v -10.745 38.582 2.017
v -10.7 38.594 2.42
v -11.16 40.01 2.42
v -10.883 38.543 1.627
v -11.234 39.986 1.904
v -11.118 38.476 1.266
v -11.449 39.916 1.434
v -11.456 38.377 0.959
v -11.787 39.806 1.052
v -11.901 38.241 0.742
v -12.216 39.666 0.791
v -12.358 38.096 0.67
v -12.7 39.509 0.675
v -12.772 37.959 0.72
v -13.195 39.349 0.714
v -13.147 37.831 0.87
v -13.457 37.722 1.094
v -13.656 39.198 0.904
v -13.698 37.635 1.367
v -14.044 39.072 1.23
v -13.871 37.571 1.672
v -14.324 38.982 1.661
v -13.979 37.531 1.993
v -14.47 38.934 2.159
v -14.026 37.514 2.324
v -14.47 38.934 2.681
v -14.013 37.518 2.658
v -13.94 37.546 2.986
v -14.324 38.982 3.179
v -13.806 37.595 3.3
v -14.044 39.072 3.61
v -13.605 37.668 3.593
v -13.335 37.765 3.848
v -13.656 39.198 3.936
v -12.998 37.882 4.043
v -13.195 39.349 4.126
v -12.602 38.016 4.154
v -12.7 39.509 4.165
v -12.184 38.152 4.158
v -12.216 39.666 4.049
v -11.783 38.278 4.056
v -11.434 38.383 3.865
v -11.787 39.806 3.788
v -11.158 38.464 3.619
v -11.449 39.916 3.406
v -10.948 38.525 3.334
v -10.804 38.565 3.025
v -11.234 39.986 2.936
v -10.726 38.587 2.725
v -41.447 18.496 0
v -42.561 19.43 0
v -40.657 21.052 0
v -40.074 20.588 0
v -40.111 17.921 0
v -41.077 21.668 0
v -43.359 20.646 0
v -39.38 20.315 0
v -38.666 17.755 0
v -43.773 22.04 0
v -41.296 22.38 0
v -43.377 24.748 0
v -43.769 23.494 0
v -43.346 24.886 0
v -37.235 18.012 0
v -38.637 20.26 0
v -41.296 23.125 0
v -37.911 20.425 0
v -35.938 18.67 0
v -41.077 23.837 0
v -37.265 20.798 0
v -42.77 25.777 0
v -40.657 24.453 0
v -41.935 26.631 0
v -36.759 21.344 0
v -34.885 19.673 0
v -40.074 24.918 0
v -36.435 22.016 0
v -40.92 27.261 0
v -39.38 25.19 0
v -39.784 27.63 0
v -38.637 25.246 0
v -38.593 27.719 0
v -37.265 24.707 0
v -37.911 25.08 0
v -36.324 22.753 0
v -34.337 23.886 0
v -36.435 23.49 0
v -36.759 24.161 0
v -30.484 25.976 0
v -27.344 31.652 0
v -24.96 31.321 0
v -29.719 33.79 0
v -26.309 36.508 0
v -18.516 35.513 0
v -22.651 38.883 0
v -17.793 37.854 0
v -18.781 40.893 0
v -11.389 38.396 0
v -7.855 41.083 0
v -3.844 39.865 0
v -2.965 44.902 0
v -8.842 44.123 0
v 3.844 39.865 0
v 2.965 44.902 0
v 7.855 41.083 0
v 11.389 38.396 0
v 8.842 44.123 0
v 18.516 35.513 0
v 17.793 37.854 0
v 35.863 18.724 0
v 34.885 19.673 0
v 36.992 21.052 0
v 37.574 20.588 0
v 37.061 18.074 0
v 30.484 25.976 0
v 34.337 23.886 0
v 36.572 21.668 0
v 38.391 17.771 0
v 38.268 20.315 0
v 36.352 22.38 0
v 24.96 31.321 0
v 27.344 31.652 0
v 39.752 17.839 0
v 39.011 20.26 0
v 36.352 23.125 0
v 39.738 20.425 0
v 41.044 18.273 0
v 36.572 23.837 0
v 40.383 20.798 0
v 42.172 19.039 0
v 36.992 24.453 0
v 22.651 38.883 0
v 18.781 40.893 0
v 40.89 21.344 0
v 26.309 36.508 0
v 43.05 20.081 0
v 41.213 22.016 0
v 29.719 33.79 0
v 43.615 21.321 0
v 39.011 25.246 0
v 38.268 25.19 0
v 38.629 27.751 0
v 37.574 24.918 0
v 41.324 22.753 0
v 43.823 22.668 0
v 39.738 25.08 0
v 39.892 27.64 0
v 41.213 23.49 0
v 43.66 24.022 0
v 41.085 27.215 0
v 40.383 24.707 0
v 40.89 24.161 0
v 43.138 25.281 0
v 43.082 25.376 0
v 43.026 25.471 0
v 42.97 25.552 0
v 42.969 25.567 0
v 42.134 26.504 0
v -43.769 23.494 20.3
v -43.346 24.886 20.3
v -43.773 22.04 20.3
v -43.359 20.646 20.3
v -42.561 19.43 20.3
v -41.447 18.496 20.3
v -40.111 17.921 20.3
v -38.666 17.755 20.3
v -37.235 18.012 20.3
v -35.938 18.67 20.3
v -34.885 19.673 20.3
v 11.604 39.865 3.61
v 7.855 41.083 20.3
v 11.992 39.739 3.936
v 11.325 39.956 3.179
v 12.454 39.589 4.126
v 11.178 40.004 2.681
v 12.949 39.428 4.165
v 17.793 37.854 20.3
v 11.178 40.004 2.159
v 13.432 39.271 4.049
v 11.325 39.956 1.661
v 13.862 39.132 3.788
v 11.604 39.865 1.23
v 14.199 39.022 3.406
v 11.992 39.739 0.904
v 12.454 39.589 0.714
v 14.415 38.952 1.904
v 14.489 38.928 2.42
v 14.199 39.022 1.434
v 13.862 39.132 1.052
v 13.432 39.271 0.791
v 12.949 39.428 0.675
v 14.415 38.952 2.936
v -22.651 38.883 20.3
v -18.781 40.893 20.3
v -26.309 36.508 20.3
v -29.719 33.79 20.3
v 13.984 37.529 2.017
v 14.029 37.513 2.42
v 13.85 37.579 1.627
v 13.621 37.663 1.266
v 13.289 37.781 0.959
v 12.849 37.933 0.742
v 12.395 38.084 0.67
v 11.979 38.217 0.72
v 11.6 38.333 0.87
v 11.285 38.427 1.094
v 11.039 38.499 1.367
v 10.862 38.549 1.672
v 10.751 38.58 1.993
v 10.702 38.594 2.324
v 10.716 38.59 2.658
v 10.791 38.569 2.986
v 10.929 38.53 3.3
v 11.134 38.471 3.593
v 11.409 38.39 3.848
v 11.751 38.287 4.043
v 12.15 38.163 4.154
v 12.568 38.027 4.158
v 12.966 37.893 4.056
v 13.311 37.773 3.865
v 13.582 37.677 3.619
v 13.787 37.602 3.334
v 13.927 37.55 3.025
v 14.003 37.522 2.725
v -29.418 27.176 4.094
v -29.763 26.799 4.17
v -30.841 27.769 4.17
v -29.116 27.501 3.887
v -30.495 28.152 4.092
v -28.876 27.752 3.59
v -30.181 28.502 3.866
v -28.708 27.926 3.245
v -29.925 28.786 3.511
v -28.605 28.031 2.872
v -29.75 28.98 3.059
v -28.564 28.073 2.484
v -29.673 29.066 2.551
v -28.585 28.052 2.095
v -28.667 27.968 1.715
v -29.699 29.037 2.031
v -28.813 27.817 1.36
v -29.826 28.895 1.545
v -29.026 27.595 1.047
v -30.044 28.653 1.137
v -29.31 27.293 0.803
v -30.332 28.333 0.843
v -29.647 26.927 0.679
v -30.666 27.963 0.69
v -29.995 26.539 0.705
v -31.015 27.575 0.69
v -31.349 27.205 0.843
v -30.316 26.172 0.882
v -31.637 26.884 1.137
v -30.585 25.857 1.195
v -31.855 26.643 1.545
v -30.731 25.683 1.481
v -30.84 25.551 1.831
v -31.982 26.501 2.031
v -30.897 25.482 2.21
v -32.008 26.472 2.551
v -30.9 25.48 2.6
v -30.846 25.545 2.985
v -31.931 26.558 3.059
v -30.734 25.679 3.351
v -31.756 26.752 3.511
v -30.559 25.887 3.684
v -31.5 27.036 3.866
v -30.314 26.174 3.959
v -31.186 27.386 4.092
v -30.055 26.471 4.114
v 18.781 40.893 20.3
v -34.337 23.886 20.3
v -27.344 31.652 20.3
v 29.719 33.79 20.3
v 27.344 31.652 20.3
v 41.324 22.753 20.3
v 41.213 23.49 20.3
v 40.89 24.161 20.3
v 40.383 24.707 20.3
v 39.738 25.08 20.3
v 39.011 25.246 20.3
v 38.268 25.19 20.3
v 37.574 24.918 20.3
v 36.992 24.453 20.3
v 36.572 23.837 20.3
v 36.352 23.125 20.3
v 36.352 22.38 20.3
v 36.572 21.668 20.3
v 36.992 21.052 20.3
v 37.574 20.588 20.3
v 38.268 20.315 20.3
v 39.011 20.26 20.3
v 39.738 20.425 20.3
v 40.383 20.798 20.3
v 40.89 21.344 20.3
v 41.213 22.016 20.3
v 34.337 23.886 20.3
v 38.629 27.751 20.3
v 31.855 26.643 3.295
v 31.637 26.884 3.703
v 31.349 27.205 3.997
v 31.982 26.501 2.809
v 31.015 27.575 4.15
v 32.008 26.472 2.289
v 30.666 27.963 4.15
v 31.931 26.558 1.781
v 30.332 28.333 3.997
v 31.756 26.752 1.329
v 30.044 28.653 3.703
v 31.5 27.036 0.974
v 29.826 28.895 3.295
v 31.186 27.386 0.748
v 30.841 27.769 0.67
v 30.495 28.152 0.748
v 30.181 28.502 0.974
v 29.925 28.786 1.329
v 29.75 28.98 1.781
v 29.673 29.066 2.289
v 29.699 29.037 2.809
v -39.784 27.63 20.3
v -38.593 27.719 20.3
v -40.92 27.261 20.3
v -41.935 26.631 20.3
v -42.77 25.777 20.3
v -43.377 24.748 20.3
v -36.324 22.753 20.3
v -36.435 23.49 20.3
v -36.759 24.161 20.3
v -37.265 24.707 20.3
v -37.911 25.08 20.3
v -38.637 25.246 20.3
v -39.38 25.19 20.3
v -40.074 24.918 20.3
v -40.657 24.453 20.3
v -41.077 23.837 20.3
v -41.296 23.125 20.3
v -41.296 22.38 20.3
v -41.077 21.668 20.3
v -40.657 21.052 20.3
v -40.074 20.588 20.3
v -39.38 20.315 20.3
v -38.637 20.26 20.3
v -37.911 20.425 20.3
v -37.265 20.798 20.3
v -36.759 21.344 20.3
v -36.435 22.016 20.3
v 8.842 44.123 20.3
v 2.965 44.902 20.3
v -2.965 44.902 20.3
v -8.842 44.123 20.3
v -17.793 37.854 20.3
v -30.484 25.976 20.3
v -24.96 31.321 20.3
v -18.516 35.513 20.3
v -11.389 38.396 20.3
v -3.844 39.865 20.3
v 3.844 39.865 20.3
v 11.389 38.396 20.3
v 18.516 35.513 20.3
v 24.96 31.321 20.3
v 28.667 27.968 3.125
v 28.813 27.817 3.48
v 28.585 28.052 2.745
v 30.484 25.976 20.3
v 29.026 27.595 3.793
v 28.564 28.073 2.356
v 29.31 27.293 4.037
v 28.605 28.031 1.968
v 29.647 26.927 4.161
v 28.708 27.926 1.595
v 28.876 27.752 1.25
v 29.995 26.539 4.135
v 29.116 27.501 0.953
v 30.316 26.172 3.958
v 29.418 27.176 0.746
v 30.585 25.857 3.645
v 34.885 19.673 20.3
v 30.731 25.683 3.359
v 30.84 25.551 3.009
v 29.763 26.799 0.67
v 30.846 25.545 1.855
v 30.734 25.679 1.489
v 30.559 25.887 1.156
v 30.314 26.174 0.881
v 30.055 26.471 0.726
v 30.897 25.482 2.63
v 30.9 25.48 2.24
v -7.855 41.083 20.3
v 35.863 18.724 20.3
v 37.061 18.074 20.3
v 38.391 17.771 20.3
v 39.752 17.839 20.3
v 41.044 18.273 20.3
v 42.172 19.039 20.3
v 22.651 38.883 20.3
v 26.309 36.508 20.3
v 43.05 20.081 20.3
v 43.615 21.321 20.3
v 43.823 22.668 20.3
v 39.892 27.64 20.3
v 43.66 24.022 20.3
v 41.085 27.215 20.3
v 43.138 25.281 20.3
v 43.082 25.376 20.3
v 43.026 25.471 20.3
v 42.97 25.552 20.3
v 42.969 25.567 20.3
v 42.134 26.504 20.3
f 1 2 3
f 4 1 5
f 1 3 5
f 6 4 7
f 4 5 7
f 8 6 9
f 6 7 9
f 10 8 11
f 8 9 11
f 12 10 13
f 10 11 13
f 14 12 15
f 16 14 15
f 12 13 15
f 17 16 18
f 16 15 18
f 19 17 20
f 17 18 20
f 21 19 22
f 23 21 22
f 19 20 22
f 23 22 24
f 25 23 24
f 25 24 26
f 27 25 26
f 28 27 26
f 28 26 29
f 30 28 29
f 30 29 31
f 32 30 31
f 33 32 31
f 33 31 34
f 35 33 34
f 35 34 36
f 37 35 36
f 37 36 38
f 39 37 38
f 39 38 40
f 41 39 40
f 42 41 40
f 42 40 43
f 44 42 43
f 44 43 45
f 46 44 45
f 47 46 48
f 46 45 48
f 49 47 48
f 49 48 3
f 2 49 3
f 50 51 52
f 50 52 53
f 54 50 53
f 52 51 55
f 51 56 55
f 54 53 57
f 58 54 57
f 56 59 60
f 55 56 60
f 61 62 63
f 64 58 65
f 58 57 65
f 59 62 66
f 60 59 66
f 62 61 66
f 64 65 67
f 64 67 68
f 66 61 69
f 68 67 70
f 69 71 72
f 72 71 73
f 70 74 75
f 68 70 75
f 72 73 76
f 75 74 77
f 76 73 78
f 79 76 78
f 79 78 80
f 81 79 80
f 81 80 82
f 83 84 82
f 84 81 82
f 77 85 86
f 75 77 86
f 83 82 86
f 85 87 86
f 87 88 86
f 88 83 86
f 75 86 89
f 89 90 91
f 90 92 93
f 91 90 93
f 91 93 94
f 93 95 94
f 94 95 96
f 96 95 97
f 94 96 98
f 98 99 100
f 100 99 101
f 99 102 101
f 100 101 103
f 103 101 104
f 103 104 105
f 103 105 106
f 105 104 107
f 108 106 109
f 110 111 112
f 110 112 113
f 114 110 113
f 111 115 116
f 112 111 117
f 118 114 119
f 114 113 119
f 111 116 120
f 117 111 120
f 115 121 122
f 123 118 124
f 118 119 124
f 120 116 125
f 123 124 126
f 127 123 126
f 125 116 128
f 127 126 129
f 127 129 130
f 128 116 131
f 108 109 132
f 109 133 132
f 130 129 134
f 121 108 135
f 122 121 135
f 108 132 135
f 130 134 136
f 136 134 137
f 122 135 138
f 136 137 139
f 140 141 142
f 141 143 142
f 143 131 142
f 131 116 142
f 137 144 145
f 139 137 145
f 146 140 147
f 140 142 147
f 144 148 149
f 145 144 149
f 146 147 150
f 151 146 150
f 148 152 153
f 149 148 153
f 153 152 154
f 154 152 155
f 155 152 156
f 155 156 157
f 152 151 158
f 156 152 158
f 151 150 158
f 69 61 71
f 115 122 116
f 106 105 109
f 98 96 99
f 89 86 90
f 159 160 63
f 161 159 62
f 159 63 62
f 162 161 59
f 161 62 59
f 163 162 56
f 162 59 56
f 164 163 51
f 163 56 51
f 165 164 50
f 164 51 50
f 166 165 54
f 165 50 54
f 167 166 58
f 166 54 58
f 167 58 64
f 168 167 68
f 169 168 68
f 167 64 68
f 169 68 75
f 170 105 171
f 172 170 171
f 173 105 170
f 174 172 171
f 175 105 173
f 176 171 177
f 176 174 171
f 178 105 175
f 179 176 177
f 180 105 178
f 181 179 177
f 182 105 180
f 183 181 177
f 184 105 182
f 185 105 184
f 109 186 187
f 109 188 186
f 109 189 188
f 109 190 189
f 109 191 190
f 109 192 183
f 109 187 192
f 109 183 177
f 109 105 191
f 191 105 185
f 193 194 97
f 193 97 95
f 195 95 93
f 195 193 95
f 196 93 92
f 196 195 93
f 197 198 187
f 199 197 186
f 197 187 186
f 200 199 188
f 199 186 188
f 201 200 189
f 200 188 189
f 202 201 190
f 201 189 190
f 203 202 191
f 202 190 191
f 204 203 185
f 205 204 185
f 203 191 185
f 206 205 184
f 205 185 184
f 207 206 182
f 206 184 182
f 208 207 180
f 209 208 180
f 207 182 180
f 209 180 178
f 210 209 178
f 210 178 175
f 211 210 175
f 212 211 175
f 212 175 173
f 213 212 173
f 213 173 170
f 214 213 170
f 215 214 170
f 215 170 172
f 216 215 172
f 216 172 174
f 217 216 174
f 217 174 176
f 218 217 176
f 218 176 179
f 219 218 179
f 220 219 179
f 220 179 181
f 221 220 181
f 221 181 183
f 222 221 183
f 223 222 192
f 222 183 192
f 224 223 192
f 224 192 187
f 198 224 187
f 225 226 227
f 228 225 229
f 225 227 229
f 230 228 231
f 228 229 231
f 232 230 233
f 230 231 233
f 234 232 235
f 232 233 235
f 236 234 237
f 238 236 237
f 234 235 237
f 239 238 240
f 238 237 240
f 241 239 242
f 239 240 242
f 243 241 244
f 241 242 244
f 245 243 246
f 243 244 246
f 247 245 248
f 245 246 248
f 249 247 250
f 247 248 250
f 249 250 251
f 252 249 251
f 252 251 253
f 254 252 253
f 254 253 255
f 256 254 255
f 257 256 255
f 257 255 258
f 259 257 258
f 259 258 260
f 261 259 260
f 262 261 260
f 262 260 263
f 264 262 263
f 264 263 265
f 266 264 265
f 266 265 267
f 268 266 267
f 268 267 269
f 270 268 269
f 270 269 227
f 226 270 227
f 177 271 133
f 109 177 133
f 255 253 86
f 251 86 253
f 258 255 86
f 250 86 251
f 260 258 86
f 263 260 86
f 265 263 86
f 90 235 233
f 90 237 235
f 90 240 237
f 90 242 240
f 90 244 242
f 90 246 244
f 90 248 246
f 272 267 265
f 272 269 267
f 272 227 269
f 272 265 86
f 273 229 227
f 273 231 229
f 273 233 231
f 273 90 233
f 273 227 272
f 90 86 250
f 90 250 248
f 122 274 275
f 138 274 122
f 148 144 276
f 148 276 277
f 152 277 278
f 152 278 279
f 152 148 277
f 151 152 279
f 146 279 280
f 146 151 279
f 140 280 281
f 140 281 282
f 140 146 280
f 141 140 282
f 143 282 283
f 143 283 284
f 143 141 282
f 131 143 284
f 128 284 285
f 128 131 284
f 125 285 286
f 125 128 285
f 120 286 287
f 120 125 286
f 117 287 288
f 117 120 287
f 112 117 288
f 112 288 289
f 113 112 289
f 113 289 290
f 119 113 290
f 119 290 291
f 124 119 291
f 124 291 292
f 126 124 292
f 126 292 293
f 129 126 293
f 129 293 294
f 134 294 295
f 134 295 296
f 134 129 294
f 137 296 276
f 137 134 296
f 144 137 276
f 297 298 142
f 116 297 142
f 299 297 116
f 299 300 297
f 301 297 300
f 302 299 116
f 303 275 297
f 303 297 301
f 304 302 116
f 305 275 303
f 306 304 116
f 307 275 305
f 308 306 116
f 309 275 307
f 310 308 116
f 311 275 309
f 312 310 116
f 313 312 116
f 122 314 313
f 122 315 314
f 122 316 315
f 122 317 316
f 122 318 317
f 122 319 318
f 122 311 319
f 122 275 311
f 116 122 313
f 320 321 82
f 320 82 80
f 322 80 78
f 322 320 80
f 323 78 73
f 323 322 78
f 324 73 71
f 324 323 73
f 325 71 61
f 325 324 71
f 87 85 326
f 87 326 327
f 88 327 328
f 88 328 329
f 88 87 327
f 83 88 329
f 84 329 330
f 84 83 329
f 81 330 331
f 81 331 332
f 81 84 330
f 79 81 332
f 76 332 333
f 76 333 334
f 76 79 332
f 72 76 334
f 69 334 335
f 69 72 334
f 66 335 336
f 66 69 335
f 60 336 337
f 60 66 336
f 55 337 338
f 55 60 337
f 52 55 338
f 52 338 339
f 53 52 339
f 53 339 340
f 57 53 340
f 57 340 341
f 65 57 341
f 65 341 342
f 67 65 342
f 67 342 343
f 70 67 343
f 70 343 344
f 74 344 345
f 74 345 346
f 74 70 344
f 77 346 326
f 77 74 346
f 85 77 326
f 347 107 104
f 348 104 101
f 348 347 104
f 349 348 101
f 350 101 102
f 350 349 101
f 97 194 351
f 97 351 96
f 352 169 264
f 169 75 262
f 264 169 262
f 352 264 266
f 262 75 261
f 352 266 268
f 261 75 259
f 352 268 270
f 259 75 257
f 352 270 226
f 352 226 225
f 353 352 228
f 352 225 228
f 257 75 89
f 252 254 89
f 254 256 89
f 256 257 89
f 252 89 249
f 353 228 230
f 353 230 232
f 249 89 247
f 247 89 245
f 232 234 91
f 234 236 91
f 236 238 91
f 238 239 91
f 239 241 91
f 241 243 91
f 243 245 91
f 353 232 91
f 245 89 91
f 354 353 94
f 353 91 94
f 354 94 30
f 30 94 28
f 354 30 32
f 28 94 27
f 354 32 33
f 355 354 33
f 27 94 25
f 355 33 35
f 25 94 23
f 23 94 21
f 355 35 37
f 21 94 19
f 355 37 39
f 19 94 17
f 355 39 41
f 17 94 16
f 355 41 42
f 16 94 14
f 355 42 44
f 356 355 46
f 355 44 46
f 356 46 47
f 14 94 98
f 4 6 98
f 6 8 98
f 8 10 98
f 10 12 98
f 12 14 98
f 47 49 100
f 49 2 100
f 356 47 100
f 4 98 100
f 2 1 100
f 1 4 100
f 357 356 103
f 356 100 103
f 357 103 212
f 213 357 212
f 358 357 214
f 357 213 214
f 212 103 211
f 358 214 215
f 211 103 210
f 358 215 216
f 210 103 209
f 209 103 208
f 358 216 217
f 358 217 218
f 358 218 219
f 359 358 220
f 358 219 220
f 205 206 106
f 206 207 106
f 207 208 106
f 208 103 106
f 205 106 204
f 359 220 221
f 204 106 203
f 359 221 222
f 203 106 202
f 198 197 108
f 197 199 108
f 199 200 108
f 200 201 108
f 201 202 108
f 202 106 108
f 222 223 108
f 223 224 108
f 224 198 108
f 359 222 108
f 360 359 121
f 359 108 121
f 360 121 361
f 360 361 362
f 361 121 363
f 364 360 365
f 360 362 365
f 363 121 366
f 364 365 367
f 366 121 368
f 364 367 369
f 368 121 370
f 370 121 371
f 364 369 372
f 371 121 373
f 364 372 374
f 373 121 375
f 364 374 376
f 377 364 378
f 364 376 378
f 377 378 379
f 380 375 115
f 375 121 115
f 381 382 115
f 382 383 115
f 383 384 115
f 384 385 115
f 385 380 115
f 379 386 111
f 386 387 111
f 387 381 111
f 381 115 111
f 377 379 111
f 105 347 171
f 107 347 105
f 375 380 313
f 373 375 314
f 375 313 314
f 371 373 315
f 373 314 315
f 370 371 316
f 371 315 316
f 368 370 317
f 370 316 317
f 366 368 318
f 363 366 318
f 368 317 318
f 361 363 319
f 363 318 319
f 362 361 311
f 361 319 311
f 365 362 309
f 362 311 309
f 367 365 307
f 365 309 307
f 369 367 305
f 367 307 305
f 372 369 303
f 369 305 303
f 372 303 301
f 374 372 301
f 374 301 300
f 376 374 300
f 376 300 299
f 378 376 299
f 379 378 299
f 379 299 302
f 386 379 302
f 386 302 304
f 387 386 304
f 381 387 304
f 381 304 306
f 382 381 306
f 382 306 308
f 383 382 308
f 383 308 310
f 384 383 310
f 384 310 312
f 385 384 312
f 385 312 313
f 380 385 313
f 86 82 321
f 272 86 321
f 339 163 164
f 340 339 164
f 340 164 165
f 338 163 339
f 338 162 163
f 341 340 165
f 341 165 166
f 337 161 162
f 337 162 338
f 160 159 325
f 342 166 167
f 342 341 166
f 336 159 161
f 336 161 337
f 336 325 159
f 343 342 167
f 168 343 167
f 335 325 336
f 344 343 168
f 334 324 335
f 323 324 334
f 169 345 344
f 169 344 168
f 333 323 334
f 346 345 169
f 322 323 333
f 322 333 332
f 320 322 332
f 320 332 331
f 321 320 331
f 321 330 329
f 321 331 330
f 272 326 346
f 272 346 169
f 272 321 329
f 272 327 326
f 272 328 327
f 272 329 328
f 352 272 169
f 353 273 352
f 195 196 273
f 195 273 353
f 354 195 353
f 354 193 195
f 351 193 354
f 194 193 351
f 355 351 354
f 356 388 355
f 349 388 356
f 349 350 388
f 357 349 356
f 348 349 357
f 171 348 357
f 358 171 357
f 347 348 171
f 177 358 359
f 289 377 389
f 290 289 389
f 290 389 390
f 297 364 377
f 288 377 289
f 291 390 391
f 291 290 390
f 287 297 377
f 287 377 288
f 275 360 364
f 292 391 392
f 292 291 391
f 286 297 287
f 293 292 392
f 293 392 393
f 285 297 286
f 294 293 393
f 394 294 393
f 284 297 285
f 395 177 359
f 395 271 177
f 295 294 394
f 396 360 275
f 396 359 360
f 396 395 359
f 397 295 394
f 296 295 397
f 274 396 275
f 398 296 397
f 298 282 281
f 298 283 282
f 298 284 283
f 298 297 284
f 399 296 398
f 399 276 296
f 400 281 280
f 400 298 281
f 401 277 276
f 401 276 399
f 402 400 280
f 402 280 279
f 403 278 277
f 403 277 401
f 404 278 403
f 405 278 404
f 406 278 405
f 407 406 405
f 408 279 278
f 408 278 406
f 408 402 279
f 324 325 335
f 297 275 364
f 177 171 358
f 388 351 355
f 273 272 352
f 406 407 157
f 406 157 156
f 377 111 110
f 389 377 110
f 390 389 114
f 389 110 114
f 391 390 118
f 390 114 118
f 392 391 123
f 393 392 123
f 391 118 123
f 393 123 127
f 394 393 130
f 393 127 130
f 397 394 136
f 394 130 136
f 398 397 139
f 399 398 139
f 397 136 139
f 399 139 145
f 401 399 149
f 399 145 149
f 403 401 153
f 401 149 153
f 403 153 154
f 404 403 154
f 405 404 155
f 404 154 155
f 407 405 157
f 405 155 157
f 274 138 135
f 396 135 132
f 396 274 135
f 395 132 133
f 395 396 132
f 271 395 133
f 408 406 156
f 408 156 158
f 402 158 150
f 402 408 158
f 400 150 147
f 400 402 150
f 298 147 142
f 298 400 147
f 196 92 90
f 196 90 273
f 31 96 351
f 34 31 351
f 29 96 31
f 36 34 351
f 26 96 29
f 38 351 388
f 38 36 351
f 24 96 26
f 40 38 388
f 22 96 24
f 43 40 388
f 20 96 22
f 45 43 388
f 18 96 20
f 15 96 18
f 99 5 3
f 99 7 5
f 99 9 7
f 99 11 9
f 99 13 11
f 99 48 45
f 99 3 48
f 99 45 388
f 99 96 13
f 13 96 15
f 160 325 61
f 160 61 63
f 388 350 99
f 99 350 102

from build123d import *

# Parameters (mm, degrees)
ESBO_O2_R                = 2.5
RESSALTO_EXTRUS_O1_DEPTH = 20.3
ESBO_O3_R                = 1.75
CORTE_EXTRUS_O1_DEPTH    = 20.3
ESBO_O4_W                = 10.45
ESBO_O4_H                = 20.3
CORTE_EXTRUS_O3_DEPTH    = 8.5
ESBO_O5_W                = 20.3
ESBO_O5_H                = 10.45
CORTE_EXTRUS_O4_DEPTH    = 8.5
ESBO_O6_W                = 10.45
ESBO_O6_H                = 20.3
CORTE_EXTRUS_O5_DEPTH    = 8.5
ESBO_O7_W                = 20.3
ESBO_O7_H                = 10.45
CORTE_EXTRUS_O6_DEPTH    = 8.5
ESBO_O8_R                = 1.75
CORTE_EXTRUS_O7_DEPTH    = 8
ESBO_O10_R               = 1.75
CORTE_EXTRUS_O8_DEPTH    = 8
ESBO_O9_R                = 1.75
CORTE_EXTRUS_O9_DEPTH    = 8
CORTE_EXTRUS_O10_DEPTH   = 21.3000001
CORTE_EXTRUS_O13_DEPTH   = 21.3000001


with BuildPart() as part:
    # Esboço2 → Ressalto-extrusão1 (new body)
    with BuildSketch(Plane.XY):
        with BuildLine():
            ThreePointArc((43.137997257, 25.280688137), (0, 50), (-43.137997257, 25.280688137))
            ThreePointArc((-43.137997257, 25.280688137), (-41.634338387, 18.617028874), (-34.88523184, 19.672919779))
            ThreePointArc((-34.88523184, 19.672919779), (0, 40.050008404), (34.88523184, 19.672919779))
            ThreePointArc((34.88523184, 19.672919779), (41.634338387, 18.617028874), (43.137997257, 25.280688137))
        make_face()
        with Locations((-38.824197531, 22.752619324)):
            Circle(ESBO_O2_R, mode=Mode.SUBTRACT)
        with Locations((38.824197531, 22.752619324)):
            Circle(ESBO_O2_R, mode=Mode.SUBTRACT)
    extrude(amount=RESSALTO_EXTRUS_O1_DEPTH)

    # Esboço3 → Corte-extrusão1 (cut)
    with BuildSketch(Plane(origin=(15.450849719, 47.552825815, 0), x_dir=(0.951056516, -0.309016994, 0), z_dir=(0.309016994, 0.951056516, 0))):
        with Locations((0, -2.42)):
            Circle(ESBO_O3_R)
    extrude(amount=-CORTE_EXTRUS_O1_DEPTH, mode=Mode.SUBTRACT)

    # Esboço4 → Corte-extrusão3 (cut)
    with BuildSketch(Plane(origin=(15.450849719, 47.552825815, 0), x_dir=(0.951056516, -0.309016994, 0), z_dir=(0.309016994, 0.951056516, 0))):
        with Locations((0, -10.15)):
            Rectangle(ESBO_O4_W, ESBO_O4_H)
    extrude(amount=-CORTE_EXTRUS_O3_DEPTH, mode=Mode.SUBTRACT)

    # Esboço5 → Corte-extrusão4 (cut)
    with BuildSketch(Plane(origin=(37.157241274, 33.456530318, 0), x_dir=(0, 0, -1), z_dir=(0.743144825, 0.669130606, 0))):
        with Locations((-10.15, 0)):
            Rectangle(ESBO_O5_W, ESBO_O5_H)
    extrude(amount=-CORTE_EXTRUS_O4_DEPTH, mode=Mode.SUBTRACT)

    # Esboço6 → Corte-extrusão5 (cut)
    with BuildSketch(Plane(origin=(-15.450849719, 47.552825815, 0), x_dir=(0.951056516, 0.309016994, 0), z_dir=(-0.309016994, 0.951056516, 0))):
        with Locations((0, -10.15)):
            Rectangle(ESBO_O6_W, ESBO_O6_H)
    extrude(amount=-CORTE_EXTRUS_O5_DEPTH, mode=Mode.SUBTRACT)

    # Esboço7 → Corte-extrusão6 (cut)
    with BuildSketch(Plane(origin=(-37.157241274, 33.456530318, 0), x_dir=(0, 0, 1), z_dir=(-0.743144825, 0.669130606, 0))):
        with Locations((10.15, 0)):
            Rectangle(ESBO_O7_W, ESBO_O7_H)
    extrude(amount=-CORTE_EXTRUS_O6_DEPTH, mode=Mode.SUBTRACT)

    # Esboço8 → Corte-extrusão7 (cut)
    with BuildSketch(Plane(origin=(30.840510257, 27.768920164, 0), x_dir=(0, 0, -1), z_dir=(0.743144825, 0.669130606, 0))):
        with Locations((-2.42, 0)):
            Circle(ESBO_O8_R)
    extrude(amount=-CORTE_EXTRUS_O7_DEPTH, mode=Mode.SUBTRACT)

    # Esboço10 → Corte-extrusão8 (cut)
    with BuildSketch(Plane(origin=(-30.840510257, 27.768920164, 0), x_dir=(0, 0, 1), z_dir=(-0.743144825, 0.669130606, 0))):
        with Locations((2.42, 0)):
            Circle(ESBO_O10_R)
    extrude(amount=-CORTE_EXTRUS_O8_DEPTH, mode=Mode.SUBTRACT)

    # Esboço9 → Corte-extrusão9 (cut)
    with BuildSketch(Plane(origin=(-12.824205267, 39.468845426, 0), x_dir=(0.951056516, 0.309016994, 0), z_dir=(-0.309016994, 0.951056516, 0))):
        with Locations((0, -2.42)):
            Circle(ESBO_O9_R)
    extrude(amount=-CORTE_EXTRUS_O9_DEPTH, mode=Mode.SUBTRACT)

    # Esboço11 → Corte-extrusão10 (cut, through all)
    with BuildSketch(Plane.XY.offset(20.3)):
        with BuildLine():
            Line((-40.450008581, 29.390420306), (-38.593336029, 27.718664832))
            ThreePointArc((-38.593336029, 27.718664832), (-41.446519528, 26.976164323), (-43.377460924, 24.74828901))
            Line((-43.377460924, 24.74828901), (-42.327289397, 29.390420306))
            Line((-42.327289397, 29.390420306), (-40.450008581, 29.390420306))
        make_face()
        with BuildLine():
            Line((38.629484885, 27.751213408), (40.450008581, 29.390420306))
            Line((40.450008581, 29.390420306), (42.795606827, 28.974236974))
            Line((42.795606827, 28.974236974), (42.969901633, 25.552082367))
            ThreePointArc((42.969901633, 25.552082367), (41.08508844, 27.214931295), (38.629484885, 27.751213408))
        make_face()
    extrude(amount=-CORTE_EXTRUS_O10_DEPTH, mode=Mode.SUBTRACT)

    # Esboço13 → Corte-extrusão13 (cut, through all)
    with BuildSketch(Plane.XY.offset(20.3)):
        with BuildLine():
            Line((-43.591003867, 44.387154562), (-0.084802266, 65.050582409))
            Line((-0.084802266, 65.050582409), (44.470714032, 40.916344415))
            Line((44.470714032, 40.916344415), (33.115675704, 30.468869731))
            ThreePointArc((33.115675704, 30.468869731), (-0.45988999, 44.997649952), (-33.731495865, 29.785670828))
            Line((-33.731495865, 29.785670828), (-43.591003867, 44.387154562))
        make_face()
    extrude(amount=-CORTE_EXTRUS_O13_DEPTH, mode=Mode.SUBTRACT)


solid = part.part
